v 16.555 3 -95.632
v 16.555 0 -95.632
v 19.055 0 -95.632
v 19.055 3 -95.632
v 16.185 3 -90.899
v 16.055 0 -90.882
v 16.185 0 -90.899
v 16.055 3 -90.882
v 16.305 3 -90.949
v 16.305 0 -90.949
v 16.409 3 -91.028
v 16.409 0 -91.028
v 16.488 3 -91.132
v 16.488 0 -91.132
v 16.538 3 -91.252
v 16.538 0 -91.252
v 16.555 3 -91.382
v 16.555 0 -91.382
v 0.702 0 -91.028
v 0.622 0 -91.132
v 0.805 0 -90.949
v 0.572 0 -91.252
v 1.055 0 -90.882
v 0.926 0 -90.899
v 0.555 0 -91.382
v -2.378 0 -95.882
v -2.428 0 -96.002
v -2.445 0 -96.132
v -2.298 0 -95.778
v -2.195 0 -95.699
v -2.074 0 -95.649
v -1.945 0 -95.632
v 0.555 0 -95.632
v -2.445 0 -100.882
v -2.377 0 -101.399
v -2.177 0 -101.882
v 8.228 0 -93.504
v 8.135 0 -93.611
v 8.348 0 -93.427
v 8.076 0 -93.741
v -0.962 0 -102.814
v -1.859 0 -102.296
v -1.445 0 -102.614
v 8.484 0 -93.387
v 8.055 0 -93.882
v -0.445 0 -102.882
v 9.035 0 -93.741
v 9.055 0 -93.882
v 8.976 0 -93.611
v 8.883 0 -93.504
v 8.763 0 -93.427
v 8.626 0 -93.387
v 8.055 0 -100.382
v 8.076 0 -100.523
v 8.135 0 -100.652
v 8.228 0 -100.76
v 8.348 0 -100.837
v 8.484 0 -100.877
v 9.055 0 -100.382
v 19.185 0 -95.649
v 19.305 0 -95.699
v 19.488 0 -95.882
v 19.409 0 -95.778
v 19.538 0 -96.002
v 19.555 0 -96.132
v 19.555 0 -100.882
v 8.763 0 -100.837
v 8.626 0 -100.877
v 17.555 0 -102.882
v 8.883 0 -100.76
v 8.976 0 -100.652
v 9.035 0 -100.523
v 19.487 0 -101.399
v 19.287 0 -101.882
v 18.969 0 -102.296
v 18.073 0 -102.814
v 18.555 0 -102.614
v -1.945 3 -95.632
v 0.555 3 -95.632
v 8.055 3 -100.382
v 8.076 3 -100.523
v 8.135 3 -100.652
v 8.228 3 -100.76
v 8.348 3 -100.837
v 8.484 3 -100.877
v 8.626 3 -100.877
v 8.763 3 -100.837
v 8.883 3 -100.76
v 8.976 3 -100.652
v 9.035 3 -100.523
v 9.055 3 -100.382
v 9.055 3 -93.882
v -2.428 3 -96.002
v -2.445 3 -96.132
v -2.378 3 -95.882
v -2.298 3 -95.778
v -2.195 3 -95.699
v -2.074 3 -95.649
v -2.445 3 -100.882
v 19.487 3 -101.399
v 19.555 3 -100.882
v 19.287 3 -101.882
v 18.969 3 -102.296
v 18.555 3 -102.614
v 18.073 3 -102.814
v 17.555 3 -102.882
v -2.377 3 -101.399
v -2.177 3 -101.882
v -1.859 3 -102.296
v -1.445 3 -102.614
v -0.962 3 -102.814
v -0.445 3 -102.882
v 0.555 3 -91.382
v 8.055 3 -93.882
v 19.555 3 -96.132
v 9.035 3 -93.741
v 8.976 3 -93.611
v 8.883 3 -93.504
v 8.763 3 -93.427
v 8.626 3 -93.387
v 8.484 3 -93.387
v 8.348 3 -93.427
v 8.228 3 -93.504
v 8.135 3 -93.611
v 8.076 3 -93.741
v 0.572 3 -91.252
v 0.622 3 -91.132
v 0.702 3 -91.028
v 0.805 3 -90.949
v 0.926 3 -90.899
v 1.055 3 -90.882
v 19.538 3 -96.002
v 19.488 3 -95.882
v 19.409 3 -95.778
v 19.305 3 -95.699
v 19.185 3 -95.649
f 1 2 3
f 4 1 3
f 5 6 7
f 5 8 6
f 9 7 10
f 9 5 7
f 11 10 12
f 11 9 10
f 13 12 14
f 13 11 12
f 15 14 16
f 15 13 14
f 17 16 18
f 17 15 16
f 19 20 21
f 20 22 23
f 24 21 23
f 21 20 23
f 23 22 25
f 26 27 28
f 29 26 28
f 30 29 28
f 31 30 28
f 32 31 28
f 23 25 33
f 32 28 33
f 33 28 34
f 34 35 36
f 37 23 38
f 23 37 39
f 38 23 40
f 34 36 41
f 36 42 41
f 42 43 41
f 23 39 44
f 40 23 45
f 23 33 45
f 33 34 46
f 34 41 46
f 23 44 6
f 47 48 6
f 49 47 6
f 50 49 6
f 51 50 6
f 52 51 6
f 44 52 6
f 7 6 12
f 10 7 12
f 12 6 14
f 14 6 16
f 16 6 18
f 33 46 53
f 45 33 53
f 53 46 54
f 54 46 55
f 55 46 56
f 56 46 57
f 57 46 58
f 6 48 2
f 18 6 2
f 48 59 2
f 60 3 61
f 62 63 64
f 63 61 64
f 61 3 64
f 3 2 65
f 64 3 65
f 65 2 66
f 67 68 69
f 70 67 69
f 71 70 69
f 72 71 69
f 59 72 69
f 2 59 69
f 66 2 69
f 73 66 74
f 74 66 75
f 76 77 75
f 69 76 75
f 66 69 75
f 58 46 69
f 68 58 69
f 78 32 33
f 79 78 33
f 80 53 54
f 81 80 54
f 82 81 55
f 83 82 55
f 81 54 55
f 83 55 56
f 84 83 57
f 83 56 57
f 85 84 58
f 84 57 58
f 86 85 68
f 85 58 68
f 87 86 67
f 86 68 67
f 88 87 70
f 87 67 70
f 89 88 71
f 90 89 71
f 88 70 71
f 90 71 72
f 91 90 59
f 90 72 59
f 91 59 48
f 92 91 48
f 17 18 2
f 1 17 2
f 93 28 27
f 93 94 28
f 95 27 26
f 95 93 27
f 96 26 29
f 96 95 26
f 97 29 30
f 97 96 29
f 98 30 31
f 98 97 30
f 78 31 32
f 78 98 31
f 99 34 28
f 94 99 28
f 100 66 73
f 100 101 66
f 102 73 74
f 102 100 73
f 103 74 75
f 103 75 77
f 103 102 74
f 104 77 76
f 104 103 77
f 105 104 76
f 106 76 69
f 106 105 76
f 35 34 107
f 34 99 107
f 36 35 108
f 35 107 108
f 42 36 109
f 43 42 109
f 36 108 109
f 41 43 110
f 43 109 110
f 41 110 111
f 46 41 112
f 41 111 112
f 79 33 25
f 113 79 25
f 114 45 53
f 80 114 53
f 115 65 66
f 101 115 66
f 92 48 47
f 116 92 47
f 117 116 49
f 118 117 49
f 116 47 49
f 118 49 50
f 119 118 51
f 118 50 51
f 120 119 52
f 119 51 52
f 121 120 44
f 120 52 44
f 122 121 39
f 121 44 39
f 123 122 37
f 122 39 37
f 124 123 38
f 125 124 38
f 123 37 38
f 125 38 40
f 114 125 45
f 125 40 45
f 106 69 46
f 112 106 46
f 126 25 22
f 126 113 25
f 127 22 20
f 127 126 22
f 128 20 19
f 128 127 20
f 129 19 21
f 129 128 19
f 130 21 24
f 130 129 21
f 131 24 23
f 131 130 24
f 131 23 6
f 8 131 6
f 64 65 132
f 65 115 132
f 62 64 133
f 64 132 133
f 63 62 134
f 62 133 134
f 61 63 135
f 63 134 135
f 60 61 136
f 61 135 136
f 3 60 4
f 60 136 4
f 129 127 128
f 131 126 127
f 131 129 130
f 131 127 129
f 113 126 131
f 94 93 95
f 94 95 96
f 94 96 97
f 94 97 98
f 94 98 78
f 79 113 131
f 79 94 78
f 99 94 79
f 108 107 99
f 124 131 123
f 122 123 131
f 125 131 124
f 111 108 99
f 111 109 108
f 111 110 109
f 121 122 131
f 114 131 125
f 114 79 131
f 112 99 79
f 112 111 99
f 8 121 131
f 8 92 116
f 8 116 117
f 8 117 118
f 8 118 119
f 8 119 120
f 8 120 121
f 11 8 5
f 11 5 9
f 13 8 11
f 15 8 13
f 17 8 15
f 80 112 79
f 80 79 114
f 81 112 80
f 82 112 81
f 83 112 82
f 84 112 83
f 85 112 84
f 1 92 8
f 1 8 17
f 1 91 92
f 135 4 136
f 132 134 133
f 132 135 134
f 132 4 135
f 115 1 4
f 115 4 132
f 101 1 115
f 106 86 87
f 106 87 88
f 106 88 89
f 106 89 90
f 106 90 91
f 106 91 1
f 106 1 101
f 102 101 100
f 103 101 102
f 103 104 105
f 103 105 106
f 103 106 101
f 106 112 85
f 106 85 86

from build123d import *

# Parameters (mm, degrees)
BOSS_EXTRUDE1_DEPTH = 3
FILLET1_R           = 2
FILLET2_R           = 0.5


with BuildPart() as part:
    # Sketch1 → Boss-Extrude1 (new body)
    with BuildSketch(Plane(origin=(0, 0, 0), x_dir=(1, 0, 0), z_dir=(0, 1, 0))):
        Polygon((0.555255475, 90.8817274), (16.555255475, 90.8817274), (16.555255475, 95.6317274), (19.555255475, 95.6317274), (19.555255475, 102.8817274), (-2.444744525, 102.8817274), (-2.444744525, 95.6317274), (0.555255475, 95.6317274), align=None)
        with BuildLine():
            ThreePointArc((8.055255475, 100.3817274), (8.555255475, 100.8817274), (9.055255475, 100.3817274))
            Line((9.055255475, 100.3817274), (9.055255475, 93.8817274))
            ThreePointArc((9.055255475, 93.8817274), (8.555255475, 93.3817274), (8.055255475, 93.8817274))
            Line((8.055255475, 93.8817274), (8.055255475, 100.3817274))
        make_face(mode=Mode.SUBTRACT)
    extrude(amount=BOSS_EXTRUDE1_DEPTH)

    # Fillet1
    fillet1_edges = [part.edges().sort_by_distance(p)[0] for p in [
        (-2.444744525, 1.5, -102.8817274),
        (19.555255475, 1.5, -102.8817274),
    ]]
    fillet(fillet1_edges, radius=FILLET1_R)

    # Fillet2
    fillet2_edges = [part.edges().sort_by_distance(p)[0] for p in [
        (-2.444744525, 1.5, -95.6317274),
        (19.555255475, 1.5, -95.6317274),
        (16.555255475, 1.5, -90.8817274),
        (0.555255475, 1.5, -90.8817274),
    ]]
    fillet(fillet2_edges, radius=FILLET2_R)


solid = part.part
